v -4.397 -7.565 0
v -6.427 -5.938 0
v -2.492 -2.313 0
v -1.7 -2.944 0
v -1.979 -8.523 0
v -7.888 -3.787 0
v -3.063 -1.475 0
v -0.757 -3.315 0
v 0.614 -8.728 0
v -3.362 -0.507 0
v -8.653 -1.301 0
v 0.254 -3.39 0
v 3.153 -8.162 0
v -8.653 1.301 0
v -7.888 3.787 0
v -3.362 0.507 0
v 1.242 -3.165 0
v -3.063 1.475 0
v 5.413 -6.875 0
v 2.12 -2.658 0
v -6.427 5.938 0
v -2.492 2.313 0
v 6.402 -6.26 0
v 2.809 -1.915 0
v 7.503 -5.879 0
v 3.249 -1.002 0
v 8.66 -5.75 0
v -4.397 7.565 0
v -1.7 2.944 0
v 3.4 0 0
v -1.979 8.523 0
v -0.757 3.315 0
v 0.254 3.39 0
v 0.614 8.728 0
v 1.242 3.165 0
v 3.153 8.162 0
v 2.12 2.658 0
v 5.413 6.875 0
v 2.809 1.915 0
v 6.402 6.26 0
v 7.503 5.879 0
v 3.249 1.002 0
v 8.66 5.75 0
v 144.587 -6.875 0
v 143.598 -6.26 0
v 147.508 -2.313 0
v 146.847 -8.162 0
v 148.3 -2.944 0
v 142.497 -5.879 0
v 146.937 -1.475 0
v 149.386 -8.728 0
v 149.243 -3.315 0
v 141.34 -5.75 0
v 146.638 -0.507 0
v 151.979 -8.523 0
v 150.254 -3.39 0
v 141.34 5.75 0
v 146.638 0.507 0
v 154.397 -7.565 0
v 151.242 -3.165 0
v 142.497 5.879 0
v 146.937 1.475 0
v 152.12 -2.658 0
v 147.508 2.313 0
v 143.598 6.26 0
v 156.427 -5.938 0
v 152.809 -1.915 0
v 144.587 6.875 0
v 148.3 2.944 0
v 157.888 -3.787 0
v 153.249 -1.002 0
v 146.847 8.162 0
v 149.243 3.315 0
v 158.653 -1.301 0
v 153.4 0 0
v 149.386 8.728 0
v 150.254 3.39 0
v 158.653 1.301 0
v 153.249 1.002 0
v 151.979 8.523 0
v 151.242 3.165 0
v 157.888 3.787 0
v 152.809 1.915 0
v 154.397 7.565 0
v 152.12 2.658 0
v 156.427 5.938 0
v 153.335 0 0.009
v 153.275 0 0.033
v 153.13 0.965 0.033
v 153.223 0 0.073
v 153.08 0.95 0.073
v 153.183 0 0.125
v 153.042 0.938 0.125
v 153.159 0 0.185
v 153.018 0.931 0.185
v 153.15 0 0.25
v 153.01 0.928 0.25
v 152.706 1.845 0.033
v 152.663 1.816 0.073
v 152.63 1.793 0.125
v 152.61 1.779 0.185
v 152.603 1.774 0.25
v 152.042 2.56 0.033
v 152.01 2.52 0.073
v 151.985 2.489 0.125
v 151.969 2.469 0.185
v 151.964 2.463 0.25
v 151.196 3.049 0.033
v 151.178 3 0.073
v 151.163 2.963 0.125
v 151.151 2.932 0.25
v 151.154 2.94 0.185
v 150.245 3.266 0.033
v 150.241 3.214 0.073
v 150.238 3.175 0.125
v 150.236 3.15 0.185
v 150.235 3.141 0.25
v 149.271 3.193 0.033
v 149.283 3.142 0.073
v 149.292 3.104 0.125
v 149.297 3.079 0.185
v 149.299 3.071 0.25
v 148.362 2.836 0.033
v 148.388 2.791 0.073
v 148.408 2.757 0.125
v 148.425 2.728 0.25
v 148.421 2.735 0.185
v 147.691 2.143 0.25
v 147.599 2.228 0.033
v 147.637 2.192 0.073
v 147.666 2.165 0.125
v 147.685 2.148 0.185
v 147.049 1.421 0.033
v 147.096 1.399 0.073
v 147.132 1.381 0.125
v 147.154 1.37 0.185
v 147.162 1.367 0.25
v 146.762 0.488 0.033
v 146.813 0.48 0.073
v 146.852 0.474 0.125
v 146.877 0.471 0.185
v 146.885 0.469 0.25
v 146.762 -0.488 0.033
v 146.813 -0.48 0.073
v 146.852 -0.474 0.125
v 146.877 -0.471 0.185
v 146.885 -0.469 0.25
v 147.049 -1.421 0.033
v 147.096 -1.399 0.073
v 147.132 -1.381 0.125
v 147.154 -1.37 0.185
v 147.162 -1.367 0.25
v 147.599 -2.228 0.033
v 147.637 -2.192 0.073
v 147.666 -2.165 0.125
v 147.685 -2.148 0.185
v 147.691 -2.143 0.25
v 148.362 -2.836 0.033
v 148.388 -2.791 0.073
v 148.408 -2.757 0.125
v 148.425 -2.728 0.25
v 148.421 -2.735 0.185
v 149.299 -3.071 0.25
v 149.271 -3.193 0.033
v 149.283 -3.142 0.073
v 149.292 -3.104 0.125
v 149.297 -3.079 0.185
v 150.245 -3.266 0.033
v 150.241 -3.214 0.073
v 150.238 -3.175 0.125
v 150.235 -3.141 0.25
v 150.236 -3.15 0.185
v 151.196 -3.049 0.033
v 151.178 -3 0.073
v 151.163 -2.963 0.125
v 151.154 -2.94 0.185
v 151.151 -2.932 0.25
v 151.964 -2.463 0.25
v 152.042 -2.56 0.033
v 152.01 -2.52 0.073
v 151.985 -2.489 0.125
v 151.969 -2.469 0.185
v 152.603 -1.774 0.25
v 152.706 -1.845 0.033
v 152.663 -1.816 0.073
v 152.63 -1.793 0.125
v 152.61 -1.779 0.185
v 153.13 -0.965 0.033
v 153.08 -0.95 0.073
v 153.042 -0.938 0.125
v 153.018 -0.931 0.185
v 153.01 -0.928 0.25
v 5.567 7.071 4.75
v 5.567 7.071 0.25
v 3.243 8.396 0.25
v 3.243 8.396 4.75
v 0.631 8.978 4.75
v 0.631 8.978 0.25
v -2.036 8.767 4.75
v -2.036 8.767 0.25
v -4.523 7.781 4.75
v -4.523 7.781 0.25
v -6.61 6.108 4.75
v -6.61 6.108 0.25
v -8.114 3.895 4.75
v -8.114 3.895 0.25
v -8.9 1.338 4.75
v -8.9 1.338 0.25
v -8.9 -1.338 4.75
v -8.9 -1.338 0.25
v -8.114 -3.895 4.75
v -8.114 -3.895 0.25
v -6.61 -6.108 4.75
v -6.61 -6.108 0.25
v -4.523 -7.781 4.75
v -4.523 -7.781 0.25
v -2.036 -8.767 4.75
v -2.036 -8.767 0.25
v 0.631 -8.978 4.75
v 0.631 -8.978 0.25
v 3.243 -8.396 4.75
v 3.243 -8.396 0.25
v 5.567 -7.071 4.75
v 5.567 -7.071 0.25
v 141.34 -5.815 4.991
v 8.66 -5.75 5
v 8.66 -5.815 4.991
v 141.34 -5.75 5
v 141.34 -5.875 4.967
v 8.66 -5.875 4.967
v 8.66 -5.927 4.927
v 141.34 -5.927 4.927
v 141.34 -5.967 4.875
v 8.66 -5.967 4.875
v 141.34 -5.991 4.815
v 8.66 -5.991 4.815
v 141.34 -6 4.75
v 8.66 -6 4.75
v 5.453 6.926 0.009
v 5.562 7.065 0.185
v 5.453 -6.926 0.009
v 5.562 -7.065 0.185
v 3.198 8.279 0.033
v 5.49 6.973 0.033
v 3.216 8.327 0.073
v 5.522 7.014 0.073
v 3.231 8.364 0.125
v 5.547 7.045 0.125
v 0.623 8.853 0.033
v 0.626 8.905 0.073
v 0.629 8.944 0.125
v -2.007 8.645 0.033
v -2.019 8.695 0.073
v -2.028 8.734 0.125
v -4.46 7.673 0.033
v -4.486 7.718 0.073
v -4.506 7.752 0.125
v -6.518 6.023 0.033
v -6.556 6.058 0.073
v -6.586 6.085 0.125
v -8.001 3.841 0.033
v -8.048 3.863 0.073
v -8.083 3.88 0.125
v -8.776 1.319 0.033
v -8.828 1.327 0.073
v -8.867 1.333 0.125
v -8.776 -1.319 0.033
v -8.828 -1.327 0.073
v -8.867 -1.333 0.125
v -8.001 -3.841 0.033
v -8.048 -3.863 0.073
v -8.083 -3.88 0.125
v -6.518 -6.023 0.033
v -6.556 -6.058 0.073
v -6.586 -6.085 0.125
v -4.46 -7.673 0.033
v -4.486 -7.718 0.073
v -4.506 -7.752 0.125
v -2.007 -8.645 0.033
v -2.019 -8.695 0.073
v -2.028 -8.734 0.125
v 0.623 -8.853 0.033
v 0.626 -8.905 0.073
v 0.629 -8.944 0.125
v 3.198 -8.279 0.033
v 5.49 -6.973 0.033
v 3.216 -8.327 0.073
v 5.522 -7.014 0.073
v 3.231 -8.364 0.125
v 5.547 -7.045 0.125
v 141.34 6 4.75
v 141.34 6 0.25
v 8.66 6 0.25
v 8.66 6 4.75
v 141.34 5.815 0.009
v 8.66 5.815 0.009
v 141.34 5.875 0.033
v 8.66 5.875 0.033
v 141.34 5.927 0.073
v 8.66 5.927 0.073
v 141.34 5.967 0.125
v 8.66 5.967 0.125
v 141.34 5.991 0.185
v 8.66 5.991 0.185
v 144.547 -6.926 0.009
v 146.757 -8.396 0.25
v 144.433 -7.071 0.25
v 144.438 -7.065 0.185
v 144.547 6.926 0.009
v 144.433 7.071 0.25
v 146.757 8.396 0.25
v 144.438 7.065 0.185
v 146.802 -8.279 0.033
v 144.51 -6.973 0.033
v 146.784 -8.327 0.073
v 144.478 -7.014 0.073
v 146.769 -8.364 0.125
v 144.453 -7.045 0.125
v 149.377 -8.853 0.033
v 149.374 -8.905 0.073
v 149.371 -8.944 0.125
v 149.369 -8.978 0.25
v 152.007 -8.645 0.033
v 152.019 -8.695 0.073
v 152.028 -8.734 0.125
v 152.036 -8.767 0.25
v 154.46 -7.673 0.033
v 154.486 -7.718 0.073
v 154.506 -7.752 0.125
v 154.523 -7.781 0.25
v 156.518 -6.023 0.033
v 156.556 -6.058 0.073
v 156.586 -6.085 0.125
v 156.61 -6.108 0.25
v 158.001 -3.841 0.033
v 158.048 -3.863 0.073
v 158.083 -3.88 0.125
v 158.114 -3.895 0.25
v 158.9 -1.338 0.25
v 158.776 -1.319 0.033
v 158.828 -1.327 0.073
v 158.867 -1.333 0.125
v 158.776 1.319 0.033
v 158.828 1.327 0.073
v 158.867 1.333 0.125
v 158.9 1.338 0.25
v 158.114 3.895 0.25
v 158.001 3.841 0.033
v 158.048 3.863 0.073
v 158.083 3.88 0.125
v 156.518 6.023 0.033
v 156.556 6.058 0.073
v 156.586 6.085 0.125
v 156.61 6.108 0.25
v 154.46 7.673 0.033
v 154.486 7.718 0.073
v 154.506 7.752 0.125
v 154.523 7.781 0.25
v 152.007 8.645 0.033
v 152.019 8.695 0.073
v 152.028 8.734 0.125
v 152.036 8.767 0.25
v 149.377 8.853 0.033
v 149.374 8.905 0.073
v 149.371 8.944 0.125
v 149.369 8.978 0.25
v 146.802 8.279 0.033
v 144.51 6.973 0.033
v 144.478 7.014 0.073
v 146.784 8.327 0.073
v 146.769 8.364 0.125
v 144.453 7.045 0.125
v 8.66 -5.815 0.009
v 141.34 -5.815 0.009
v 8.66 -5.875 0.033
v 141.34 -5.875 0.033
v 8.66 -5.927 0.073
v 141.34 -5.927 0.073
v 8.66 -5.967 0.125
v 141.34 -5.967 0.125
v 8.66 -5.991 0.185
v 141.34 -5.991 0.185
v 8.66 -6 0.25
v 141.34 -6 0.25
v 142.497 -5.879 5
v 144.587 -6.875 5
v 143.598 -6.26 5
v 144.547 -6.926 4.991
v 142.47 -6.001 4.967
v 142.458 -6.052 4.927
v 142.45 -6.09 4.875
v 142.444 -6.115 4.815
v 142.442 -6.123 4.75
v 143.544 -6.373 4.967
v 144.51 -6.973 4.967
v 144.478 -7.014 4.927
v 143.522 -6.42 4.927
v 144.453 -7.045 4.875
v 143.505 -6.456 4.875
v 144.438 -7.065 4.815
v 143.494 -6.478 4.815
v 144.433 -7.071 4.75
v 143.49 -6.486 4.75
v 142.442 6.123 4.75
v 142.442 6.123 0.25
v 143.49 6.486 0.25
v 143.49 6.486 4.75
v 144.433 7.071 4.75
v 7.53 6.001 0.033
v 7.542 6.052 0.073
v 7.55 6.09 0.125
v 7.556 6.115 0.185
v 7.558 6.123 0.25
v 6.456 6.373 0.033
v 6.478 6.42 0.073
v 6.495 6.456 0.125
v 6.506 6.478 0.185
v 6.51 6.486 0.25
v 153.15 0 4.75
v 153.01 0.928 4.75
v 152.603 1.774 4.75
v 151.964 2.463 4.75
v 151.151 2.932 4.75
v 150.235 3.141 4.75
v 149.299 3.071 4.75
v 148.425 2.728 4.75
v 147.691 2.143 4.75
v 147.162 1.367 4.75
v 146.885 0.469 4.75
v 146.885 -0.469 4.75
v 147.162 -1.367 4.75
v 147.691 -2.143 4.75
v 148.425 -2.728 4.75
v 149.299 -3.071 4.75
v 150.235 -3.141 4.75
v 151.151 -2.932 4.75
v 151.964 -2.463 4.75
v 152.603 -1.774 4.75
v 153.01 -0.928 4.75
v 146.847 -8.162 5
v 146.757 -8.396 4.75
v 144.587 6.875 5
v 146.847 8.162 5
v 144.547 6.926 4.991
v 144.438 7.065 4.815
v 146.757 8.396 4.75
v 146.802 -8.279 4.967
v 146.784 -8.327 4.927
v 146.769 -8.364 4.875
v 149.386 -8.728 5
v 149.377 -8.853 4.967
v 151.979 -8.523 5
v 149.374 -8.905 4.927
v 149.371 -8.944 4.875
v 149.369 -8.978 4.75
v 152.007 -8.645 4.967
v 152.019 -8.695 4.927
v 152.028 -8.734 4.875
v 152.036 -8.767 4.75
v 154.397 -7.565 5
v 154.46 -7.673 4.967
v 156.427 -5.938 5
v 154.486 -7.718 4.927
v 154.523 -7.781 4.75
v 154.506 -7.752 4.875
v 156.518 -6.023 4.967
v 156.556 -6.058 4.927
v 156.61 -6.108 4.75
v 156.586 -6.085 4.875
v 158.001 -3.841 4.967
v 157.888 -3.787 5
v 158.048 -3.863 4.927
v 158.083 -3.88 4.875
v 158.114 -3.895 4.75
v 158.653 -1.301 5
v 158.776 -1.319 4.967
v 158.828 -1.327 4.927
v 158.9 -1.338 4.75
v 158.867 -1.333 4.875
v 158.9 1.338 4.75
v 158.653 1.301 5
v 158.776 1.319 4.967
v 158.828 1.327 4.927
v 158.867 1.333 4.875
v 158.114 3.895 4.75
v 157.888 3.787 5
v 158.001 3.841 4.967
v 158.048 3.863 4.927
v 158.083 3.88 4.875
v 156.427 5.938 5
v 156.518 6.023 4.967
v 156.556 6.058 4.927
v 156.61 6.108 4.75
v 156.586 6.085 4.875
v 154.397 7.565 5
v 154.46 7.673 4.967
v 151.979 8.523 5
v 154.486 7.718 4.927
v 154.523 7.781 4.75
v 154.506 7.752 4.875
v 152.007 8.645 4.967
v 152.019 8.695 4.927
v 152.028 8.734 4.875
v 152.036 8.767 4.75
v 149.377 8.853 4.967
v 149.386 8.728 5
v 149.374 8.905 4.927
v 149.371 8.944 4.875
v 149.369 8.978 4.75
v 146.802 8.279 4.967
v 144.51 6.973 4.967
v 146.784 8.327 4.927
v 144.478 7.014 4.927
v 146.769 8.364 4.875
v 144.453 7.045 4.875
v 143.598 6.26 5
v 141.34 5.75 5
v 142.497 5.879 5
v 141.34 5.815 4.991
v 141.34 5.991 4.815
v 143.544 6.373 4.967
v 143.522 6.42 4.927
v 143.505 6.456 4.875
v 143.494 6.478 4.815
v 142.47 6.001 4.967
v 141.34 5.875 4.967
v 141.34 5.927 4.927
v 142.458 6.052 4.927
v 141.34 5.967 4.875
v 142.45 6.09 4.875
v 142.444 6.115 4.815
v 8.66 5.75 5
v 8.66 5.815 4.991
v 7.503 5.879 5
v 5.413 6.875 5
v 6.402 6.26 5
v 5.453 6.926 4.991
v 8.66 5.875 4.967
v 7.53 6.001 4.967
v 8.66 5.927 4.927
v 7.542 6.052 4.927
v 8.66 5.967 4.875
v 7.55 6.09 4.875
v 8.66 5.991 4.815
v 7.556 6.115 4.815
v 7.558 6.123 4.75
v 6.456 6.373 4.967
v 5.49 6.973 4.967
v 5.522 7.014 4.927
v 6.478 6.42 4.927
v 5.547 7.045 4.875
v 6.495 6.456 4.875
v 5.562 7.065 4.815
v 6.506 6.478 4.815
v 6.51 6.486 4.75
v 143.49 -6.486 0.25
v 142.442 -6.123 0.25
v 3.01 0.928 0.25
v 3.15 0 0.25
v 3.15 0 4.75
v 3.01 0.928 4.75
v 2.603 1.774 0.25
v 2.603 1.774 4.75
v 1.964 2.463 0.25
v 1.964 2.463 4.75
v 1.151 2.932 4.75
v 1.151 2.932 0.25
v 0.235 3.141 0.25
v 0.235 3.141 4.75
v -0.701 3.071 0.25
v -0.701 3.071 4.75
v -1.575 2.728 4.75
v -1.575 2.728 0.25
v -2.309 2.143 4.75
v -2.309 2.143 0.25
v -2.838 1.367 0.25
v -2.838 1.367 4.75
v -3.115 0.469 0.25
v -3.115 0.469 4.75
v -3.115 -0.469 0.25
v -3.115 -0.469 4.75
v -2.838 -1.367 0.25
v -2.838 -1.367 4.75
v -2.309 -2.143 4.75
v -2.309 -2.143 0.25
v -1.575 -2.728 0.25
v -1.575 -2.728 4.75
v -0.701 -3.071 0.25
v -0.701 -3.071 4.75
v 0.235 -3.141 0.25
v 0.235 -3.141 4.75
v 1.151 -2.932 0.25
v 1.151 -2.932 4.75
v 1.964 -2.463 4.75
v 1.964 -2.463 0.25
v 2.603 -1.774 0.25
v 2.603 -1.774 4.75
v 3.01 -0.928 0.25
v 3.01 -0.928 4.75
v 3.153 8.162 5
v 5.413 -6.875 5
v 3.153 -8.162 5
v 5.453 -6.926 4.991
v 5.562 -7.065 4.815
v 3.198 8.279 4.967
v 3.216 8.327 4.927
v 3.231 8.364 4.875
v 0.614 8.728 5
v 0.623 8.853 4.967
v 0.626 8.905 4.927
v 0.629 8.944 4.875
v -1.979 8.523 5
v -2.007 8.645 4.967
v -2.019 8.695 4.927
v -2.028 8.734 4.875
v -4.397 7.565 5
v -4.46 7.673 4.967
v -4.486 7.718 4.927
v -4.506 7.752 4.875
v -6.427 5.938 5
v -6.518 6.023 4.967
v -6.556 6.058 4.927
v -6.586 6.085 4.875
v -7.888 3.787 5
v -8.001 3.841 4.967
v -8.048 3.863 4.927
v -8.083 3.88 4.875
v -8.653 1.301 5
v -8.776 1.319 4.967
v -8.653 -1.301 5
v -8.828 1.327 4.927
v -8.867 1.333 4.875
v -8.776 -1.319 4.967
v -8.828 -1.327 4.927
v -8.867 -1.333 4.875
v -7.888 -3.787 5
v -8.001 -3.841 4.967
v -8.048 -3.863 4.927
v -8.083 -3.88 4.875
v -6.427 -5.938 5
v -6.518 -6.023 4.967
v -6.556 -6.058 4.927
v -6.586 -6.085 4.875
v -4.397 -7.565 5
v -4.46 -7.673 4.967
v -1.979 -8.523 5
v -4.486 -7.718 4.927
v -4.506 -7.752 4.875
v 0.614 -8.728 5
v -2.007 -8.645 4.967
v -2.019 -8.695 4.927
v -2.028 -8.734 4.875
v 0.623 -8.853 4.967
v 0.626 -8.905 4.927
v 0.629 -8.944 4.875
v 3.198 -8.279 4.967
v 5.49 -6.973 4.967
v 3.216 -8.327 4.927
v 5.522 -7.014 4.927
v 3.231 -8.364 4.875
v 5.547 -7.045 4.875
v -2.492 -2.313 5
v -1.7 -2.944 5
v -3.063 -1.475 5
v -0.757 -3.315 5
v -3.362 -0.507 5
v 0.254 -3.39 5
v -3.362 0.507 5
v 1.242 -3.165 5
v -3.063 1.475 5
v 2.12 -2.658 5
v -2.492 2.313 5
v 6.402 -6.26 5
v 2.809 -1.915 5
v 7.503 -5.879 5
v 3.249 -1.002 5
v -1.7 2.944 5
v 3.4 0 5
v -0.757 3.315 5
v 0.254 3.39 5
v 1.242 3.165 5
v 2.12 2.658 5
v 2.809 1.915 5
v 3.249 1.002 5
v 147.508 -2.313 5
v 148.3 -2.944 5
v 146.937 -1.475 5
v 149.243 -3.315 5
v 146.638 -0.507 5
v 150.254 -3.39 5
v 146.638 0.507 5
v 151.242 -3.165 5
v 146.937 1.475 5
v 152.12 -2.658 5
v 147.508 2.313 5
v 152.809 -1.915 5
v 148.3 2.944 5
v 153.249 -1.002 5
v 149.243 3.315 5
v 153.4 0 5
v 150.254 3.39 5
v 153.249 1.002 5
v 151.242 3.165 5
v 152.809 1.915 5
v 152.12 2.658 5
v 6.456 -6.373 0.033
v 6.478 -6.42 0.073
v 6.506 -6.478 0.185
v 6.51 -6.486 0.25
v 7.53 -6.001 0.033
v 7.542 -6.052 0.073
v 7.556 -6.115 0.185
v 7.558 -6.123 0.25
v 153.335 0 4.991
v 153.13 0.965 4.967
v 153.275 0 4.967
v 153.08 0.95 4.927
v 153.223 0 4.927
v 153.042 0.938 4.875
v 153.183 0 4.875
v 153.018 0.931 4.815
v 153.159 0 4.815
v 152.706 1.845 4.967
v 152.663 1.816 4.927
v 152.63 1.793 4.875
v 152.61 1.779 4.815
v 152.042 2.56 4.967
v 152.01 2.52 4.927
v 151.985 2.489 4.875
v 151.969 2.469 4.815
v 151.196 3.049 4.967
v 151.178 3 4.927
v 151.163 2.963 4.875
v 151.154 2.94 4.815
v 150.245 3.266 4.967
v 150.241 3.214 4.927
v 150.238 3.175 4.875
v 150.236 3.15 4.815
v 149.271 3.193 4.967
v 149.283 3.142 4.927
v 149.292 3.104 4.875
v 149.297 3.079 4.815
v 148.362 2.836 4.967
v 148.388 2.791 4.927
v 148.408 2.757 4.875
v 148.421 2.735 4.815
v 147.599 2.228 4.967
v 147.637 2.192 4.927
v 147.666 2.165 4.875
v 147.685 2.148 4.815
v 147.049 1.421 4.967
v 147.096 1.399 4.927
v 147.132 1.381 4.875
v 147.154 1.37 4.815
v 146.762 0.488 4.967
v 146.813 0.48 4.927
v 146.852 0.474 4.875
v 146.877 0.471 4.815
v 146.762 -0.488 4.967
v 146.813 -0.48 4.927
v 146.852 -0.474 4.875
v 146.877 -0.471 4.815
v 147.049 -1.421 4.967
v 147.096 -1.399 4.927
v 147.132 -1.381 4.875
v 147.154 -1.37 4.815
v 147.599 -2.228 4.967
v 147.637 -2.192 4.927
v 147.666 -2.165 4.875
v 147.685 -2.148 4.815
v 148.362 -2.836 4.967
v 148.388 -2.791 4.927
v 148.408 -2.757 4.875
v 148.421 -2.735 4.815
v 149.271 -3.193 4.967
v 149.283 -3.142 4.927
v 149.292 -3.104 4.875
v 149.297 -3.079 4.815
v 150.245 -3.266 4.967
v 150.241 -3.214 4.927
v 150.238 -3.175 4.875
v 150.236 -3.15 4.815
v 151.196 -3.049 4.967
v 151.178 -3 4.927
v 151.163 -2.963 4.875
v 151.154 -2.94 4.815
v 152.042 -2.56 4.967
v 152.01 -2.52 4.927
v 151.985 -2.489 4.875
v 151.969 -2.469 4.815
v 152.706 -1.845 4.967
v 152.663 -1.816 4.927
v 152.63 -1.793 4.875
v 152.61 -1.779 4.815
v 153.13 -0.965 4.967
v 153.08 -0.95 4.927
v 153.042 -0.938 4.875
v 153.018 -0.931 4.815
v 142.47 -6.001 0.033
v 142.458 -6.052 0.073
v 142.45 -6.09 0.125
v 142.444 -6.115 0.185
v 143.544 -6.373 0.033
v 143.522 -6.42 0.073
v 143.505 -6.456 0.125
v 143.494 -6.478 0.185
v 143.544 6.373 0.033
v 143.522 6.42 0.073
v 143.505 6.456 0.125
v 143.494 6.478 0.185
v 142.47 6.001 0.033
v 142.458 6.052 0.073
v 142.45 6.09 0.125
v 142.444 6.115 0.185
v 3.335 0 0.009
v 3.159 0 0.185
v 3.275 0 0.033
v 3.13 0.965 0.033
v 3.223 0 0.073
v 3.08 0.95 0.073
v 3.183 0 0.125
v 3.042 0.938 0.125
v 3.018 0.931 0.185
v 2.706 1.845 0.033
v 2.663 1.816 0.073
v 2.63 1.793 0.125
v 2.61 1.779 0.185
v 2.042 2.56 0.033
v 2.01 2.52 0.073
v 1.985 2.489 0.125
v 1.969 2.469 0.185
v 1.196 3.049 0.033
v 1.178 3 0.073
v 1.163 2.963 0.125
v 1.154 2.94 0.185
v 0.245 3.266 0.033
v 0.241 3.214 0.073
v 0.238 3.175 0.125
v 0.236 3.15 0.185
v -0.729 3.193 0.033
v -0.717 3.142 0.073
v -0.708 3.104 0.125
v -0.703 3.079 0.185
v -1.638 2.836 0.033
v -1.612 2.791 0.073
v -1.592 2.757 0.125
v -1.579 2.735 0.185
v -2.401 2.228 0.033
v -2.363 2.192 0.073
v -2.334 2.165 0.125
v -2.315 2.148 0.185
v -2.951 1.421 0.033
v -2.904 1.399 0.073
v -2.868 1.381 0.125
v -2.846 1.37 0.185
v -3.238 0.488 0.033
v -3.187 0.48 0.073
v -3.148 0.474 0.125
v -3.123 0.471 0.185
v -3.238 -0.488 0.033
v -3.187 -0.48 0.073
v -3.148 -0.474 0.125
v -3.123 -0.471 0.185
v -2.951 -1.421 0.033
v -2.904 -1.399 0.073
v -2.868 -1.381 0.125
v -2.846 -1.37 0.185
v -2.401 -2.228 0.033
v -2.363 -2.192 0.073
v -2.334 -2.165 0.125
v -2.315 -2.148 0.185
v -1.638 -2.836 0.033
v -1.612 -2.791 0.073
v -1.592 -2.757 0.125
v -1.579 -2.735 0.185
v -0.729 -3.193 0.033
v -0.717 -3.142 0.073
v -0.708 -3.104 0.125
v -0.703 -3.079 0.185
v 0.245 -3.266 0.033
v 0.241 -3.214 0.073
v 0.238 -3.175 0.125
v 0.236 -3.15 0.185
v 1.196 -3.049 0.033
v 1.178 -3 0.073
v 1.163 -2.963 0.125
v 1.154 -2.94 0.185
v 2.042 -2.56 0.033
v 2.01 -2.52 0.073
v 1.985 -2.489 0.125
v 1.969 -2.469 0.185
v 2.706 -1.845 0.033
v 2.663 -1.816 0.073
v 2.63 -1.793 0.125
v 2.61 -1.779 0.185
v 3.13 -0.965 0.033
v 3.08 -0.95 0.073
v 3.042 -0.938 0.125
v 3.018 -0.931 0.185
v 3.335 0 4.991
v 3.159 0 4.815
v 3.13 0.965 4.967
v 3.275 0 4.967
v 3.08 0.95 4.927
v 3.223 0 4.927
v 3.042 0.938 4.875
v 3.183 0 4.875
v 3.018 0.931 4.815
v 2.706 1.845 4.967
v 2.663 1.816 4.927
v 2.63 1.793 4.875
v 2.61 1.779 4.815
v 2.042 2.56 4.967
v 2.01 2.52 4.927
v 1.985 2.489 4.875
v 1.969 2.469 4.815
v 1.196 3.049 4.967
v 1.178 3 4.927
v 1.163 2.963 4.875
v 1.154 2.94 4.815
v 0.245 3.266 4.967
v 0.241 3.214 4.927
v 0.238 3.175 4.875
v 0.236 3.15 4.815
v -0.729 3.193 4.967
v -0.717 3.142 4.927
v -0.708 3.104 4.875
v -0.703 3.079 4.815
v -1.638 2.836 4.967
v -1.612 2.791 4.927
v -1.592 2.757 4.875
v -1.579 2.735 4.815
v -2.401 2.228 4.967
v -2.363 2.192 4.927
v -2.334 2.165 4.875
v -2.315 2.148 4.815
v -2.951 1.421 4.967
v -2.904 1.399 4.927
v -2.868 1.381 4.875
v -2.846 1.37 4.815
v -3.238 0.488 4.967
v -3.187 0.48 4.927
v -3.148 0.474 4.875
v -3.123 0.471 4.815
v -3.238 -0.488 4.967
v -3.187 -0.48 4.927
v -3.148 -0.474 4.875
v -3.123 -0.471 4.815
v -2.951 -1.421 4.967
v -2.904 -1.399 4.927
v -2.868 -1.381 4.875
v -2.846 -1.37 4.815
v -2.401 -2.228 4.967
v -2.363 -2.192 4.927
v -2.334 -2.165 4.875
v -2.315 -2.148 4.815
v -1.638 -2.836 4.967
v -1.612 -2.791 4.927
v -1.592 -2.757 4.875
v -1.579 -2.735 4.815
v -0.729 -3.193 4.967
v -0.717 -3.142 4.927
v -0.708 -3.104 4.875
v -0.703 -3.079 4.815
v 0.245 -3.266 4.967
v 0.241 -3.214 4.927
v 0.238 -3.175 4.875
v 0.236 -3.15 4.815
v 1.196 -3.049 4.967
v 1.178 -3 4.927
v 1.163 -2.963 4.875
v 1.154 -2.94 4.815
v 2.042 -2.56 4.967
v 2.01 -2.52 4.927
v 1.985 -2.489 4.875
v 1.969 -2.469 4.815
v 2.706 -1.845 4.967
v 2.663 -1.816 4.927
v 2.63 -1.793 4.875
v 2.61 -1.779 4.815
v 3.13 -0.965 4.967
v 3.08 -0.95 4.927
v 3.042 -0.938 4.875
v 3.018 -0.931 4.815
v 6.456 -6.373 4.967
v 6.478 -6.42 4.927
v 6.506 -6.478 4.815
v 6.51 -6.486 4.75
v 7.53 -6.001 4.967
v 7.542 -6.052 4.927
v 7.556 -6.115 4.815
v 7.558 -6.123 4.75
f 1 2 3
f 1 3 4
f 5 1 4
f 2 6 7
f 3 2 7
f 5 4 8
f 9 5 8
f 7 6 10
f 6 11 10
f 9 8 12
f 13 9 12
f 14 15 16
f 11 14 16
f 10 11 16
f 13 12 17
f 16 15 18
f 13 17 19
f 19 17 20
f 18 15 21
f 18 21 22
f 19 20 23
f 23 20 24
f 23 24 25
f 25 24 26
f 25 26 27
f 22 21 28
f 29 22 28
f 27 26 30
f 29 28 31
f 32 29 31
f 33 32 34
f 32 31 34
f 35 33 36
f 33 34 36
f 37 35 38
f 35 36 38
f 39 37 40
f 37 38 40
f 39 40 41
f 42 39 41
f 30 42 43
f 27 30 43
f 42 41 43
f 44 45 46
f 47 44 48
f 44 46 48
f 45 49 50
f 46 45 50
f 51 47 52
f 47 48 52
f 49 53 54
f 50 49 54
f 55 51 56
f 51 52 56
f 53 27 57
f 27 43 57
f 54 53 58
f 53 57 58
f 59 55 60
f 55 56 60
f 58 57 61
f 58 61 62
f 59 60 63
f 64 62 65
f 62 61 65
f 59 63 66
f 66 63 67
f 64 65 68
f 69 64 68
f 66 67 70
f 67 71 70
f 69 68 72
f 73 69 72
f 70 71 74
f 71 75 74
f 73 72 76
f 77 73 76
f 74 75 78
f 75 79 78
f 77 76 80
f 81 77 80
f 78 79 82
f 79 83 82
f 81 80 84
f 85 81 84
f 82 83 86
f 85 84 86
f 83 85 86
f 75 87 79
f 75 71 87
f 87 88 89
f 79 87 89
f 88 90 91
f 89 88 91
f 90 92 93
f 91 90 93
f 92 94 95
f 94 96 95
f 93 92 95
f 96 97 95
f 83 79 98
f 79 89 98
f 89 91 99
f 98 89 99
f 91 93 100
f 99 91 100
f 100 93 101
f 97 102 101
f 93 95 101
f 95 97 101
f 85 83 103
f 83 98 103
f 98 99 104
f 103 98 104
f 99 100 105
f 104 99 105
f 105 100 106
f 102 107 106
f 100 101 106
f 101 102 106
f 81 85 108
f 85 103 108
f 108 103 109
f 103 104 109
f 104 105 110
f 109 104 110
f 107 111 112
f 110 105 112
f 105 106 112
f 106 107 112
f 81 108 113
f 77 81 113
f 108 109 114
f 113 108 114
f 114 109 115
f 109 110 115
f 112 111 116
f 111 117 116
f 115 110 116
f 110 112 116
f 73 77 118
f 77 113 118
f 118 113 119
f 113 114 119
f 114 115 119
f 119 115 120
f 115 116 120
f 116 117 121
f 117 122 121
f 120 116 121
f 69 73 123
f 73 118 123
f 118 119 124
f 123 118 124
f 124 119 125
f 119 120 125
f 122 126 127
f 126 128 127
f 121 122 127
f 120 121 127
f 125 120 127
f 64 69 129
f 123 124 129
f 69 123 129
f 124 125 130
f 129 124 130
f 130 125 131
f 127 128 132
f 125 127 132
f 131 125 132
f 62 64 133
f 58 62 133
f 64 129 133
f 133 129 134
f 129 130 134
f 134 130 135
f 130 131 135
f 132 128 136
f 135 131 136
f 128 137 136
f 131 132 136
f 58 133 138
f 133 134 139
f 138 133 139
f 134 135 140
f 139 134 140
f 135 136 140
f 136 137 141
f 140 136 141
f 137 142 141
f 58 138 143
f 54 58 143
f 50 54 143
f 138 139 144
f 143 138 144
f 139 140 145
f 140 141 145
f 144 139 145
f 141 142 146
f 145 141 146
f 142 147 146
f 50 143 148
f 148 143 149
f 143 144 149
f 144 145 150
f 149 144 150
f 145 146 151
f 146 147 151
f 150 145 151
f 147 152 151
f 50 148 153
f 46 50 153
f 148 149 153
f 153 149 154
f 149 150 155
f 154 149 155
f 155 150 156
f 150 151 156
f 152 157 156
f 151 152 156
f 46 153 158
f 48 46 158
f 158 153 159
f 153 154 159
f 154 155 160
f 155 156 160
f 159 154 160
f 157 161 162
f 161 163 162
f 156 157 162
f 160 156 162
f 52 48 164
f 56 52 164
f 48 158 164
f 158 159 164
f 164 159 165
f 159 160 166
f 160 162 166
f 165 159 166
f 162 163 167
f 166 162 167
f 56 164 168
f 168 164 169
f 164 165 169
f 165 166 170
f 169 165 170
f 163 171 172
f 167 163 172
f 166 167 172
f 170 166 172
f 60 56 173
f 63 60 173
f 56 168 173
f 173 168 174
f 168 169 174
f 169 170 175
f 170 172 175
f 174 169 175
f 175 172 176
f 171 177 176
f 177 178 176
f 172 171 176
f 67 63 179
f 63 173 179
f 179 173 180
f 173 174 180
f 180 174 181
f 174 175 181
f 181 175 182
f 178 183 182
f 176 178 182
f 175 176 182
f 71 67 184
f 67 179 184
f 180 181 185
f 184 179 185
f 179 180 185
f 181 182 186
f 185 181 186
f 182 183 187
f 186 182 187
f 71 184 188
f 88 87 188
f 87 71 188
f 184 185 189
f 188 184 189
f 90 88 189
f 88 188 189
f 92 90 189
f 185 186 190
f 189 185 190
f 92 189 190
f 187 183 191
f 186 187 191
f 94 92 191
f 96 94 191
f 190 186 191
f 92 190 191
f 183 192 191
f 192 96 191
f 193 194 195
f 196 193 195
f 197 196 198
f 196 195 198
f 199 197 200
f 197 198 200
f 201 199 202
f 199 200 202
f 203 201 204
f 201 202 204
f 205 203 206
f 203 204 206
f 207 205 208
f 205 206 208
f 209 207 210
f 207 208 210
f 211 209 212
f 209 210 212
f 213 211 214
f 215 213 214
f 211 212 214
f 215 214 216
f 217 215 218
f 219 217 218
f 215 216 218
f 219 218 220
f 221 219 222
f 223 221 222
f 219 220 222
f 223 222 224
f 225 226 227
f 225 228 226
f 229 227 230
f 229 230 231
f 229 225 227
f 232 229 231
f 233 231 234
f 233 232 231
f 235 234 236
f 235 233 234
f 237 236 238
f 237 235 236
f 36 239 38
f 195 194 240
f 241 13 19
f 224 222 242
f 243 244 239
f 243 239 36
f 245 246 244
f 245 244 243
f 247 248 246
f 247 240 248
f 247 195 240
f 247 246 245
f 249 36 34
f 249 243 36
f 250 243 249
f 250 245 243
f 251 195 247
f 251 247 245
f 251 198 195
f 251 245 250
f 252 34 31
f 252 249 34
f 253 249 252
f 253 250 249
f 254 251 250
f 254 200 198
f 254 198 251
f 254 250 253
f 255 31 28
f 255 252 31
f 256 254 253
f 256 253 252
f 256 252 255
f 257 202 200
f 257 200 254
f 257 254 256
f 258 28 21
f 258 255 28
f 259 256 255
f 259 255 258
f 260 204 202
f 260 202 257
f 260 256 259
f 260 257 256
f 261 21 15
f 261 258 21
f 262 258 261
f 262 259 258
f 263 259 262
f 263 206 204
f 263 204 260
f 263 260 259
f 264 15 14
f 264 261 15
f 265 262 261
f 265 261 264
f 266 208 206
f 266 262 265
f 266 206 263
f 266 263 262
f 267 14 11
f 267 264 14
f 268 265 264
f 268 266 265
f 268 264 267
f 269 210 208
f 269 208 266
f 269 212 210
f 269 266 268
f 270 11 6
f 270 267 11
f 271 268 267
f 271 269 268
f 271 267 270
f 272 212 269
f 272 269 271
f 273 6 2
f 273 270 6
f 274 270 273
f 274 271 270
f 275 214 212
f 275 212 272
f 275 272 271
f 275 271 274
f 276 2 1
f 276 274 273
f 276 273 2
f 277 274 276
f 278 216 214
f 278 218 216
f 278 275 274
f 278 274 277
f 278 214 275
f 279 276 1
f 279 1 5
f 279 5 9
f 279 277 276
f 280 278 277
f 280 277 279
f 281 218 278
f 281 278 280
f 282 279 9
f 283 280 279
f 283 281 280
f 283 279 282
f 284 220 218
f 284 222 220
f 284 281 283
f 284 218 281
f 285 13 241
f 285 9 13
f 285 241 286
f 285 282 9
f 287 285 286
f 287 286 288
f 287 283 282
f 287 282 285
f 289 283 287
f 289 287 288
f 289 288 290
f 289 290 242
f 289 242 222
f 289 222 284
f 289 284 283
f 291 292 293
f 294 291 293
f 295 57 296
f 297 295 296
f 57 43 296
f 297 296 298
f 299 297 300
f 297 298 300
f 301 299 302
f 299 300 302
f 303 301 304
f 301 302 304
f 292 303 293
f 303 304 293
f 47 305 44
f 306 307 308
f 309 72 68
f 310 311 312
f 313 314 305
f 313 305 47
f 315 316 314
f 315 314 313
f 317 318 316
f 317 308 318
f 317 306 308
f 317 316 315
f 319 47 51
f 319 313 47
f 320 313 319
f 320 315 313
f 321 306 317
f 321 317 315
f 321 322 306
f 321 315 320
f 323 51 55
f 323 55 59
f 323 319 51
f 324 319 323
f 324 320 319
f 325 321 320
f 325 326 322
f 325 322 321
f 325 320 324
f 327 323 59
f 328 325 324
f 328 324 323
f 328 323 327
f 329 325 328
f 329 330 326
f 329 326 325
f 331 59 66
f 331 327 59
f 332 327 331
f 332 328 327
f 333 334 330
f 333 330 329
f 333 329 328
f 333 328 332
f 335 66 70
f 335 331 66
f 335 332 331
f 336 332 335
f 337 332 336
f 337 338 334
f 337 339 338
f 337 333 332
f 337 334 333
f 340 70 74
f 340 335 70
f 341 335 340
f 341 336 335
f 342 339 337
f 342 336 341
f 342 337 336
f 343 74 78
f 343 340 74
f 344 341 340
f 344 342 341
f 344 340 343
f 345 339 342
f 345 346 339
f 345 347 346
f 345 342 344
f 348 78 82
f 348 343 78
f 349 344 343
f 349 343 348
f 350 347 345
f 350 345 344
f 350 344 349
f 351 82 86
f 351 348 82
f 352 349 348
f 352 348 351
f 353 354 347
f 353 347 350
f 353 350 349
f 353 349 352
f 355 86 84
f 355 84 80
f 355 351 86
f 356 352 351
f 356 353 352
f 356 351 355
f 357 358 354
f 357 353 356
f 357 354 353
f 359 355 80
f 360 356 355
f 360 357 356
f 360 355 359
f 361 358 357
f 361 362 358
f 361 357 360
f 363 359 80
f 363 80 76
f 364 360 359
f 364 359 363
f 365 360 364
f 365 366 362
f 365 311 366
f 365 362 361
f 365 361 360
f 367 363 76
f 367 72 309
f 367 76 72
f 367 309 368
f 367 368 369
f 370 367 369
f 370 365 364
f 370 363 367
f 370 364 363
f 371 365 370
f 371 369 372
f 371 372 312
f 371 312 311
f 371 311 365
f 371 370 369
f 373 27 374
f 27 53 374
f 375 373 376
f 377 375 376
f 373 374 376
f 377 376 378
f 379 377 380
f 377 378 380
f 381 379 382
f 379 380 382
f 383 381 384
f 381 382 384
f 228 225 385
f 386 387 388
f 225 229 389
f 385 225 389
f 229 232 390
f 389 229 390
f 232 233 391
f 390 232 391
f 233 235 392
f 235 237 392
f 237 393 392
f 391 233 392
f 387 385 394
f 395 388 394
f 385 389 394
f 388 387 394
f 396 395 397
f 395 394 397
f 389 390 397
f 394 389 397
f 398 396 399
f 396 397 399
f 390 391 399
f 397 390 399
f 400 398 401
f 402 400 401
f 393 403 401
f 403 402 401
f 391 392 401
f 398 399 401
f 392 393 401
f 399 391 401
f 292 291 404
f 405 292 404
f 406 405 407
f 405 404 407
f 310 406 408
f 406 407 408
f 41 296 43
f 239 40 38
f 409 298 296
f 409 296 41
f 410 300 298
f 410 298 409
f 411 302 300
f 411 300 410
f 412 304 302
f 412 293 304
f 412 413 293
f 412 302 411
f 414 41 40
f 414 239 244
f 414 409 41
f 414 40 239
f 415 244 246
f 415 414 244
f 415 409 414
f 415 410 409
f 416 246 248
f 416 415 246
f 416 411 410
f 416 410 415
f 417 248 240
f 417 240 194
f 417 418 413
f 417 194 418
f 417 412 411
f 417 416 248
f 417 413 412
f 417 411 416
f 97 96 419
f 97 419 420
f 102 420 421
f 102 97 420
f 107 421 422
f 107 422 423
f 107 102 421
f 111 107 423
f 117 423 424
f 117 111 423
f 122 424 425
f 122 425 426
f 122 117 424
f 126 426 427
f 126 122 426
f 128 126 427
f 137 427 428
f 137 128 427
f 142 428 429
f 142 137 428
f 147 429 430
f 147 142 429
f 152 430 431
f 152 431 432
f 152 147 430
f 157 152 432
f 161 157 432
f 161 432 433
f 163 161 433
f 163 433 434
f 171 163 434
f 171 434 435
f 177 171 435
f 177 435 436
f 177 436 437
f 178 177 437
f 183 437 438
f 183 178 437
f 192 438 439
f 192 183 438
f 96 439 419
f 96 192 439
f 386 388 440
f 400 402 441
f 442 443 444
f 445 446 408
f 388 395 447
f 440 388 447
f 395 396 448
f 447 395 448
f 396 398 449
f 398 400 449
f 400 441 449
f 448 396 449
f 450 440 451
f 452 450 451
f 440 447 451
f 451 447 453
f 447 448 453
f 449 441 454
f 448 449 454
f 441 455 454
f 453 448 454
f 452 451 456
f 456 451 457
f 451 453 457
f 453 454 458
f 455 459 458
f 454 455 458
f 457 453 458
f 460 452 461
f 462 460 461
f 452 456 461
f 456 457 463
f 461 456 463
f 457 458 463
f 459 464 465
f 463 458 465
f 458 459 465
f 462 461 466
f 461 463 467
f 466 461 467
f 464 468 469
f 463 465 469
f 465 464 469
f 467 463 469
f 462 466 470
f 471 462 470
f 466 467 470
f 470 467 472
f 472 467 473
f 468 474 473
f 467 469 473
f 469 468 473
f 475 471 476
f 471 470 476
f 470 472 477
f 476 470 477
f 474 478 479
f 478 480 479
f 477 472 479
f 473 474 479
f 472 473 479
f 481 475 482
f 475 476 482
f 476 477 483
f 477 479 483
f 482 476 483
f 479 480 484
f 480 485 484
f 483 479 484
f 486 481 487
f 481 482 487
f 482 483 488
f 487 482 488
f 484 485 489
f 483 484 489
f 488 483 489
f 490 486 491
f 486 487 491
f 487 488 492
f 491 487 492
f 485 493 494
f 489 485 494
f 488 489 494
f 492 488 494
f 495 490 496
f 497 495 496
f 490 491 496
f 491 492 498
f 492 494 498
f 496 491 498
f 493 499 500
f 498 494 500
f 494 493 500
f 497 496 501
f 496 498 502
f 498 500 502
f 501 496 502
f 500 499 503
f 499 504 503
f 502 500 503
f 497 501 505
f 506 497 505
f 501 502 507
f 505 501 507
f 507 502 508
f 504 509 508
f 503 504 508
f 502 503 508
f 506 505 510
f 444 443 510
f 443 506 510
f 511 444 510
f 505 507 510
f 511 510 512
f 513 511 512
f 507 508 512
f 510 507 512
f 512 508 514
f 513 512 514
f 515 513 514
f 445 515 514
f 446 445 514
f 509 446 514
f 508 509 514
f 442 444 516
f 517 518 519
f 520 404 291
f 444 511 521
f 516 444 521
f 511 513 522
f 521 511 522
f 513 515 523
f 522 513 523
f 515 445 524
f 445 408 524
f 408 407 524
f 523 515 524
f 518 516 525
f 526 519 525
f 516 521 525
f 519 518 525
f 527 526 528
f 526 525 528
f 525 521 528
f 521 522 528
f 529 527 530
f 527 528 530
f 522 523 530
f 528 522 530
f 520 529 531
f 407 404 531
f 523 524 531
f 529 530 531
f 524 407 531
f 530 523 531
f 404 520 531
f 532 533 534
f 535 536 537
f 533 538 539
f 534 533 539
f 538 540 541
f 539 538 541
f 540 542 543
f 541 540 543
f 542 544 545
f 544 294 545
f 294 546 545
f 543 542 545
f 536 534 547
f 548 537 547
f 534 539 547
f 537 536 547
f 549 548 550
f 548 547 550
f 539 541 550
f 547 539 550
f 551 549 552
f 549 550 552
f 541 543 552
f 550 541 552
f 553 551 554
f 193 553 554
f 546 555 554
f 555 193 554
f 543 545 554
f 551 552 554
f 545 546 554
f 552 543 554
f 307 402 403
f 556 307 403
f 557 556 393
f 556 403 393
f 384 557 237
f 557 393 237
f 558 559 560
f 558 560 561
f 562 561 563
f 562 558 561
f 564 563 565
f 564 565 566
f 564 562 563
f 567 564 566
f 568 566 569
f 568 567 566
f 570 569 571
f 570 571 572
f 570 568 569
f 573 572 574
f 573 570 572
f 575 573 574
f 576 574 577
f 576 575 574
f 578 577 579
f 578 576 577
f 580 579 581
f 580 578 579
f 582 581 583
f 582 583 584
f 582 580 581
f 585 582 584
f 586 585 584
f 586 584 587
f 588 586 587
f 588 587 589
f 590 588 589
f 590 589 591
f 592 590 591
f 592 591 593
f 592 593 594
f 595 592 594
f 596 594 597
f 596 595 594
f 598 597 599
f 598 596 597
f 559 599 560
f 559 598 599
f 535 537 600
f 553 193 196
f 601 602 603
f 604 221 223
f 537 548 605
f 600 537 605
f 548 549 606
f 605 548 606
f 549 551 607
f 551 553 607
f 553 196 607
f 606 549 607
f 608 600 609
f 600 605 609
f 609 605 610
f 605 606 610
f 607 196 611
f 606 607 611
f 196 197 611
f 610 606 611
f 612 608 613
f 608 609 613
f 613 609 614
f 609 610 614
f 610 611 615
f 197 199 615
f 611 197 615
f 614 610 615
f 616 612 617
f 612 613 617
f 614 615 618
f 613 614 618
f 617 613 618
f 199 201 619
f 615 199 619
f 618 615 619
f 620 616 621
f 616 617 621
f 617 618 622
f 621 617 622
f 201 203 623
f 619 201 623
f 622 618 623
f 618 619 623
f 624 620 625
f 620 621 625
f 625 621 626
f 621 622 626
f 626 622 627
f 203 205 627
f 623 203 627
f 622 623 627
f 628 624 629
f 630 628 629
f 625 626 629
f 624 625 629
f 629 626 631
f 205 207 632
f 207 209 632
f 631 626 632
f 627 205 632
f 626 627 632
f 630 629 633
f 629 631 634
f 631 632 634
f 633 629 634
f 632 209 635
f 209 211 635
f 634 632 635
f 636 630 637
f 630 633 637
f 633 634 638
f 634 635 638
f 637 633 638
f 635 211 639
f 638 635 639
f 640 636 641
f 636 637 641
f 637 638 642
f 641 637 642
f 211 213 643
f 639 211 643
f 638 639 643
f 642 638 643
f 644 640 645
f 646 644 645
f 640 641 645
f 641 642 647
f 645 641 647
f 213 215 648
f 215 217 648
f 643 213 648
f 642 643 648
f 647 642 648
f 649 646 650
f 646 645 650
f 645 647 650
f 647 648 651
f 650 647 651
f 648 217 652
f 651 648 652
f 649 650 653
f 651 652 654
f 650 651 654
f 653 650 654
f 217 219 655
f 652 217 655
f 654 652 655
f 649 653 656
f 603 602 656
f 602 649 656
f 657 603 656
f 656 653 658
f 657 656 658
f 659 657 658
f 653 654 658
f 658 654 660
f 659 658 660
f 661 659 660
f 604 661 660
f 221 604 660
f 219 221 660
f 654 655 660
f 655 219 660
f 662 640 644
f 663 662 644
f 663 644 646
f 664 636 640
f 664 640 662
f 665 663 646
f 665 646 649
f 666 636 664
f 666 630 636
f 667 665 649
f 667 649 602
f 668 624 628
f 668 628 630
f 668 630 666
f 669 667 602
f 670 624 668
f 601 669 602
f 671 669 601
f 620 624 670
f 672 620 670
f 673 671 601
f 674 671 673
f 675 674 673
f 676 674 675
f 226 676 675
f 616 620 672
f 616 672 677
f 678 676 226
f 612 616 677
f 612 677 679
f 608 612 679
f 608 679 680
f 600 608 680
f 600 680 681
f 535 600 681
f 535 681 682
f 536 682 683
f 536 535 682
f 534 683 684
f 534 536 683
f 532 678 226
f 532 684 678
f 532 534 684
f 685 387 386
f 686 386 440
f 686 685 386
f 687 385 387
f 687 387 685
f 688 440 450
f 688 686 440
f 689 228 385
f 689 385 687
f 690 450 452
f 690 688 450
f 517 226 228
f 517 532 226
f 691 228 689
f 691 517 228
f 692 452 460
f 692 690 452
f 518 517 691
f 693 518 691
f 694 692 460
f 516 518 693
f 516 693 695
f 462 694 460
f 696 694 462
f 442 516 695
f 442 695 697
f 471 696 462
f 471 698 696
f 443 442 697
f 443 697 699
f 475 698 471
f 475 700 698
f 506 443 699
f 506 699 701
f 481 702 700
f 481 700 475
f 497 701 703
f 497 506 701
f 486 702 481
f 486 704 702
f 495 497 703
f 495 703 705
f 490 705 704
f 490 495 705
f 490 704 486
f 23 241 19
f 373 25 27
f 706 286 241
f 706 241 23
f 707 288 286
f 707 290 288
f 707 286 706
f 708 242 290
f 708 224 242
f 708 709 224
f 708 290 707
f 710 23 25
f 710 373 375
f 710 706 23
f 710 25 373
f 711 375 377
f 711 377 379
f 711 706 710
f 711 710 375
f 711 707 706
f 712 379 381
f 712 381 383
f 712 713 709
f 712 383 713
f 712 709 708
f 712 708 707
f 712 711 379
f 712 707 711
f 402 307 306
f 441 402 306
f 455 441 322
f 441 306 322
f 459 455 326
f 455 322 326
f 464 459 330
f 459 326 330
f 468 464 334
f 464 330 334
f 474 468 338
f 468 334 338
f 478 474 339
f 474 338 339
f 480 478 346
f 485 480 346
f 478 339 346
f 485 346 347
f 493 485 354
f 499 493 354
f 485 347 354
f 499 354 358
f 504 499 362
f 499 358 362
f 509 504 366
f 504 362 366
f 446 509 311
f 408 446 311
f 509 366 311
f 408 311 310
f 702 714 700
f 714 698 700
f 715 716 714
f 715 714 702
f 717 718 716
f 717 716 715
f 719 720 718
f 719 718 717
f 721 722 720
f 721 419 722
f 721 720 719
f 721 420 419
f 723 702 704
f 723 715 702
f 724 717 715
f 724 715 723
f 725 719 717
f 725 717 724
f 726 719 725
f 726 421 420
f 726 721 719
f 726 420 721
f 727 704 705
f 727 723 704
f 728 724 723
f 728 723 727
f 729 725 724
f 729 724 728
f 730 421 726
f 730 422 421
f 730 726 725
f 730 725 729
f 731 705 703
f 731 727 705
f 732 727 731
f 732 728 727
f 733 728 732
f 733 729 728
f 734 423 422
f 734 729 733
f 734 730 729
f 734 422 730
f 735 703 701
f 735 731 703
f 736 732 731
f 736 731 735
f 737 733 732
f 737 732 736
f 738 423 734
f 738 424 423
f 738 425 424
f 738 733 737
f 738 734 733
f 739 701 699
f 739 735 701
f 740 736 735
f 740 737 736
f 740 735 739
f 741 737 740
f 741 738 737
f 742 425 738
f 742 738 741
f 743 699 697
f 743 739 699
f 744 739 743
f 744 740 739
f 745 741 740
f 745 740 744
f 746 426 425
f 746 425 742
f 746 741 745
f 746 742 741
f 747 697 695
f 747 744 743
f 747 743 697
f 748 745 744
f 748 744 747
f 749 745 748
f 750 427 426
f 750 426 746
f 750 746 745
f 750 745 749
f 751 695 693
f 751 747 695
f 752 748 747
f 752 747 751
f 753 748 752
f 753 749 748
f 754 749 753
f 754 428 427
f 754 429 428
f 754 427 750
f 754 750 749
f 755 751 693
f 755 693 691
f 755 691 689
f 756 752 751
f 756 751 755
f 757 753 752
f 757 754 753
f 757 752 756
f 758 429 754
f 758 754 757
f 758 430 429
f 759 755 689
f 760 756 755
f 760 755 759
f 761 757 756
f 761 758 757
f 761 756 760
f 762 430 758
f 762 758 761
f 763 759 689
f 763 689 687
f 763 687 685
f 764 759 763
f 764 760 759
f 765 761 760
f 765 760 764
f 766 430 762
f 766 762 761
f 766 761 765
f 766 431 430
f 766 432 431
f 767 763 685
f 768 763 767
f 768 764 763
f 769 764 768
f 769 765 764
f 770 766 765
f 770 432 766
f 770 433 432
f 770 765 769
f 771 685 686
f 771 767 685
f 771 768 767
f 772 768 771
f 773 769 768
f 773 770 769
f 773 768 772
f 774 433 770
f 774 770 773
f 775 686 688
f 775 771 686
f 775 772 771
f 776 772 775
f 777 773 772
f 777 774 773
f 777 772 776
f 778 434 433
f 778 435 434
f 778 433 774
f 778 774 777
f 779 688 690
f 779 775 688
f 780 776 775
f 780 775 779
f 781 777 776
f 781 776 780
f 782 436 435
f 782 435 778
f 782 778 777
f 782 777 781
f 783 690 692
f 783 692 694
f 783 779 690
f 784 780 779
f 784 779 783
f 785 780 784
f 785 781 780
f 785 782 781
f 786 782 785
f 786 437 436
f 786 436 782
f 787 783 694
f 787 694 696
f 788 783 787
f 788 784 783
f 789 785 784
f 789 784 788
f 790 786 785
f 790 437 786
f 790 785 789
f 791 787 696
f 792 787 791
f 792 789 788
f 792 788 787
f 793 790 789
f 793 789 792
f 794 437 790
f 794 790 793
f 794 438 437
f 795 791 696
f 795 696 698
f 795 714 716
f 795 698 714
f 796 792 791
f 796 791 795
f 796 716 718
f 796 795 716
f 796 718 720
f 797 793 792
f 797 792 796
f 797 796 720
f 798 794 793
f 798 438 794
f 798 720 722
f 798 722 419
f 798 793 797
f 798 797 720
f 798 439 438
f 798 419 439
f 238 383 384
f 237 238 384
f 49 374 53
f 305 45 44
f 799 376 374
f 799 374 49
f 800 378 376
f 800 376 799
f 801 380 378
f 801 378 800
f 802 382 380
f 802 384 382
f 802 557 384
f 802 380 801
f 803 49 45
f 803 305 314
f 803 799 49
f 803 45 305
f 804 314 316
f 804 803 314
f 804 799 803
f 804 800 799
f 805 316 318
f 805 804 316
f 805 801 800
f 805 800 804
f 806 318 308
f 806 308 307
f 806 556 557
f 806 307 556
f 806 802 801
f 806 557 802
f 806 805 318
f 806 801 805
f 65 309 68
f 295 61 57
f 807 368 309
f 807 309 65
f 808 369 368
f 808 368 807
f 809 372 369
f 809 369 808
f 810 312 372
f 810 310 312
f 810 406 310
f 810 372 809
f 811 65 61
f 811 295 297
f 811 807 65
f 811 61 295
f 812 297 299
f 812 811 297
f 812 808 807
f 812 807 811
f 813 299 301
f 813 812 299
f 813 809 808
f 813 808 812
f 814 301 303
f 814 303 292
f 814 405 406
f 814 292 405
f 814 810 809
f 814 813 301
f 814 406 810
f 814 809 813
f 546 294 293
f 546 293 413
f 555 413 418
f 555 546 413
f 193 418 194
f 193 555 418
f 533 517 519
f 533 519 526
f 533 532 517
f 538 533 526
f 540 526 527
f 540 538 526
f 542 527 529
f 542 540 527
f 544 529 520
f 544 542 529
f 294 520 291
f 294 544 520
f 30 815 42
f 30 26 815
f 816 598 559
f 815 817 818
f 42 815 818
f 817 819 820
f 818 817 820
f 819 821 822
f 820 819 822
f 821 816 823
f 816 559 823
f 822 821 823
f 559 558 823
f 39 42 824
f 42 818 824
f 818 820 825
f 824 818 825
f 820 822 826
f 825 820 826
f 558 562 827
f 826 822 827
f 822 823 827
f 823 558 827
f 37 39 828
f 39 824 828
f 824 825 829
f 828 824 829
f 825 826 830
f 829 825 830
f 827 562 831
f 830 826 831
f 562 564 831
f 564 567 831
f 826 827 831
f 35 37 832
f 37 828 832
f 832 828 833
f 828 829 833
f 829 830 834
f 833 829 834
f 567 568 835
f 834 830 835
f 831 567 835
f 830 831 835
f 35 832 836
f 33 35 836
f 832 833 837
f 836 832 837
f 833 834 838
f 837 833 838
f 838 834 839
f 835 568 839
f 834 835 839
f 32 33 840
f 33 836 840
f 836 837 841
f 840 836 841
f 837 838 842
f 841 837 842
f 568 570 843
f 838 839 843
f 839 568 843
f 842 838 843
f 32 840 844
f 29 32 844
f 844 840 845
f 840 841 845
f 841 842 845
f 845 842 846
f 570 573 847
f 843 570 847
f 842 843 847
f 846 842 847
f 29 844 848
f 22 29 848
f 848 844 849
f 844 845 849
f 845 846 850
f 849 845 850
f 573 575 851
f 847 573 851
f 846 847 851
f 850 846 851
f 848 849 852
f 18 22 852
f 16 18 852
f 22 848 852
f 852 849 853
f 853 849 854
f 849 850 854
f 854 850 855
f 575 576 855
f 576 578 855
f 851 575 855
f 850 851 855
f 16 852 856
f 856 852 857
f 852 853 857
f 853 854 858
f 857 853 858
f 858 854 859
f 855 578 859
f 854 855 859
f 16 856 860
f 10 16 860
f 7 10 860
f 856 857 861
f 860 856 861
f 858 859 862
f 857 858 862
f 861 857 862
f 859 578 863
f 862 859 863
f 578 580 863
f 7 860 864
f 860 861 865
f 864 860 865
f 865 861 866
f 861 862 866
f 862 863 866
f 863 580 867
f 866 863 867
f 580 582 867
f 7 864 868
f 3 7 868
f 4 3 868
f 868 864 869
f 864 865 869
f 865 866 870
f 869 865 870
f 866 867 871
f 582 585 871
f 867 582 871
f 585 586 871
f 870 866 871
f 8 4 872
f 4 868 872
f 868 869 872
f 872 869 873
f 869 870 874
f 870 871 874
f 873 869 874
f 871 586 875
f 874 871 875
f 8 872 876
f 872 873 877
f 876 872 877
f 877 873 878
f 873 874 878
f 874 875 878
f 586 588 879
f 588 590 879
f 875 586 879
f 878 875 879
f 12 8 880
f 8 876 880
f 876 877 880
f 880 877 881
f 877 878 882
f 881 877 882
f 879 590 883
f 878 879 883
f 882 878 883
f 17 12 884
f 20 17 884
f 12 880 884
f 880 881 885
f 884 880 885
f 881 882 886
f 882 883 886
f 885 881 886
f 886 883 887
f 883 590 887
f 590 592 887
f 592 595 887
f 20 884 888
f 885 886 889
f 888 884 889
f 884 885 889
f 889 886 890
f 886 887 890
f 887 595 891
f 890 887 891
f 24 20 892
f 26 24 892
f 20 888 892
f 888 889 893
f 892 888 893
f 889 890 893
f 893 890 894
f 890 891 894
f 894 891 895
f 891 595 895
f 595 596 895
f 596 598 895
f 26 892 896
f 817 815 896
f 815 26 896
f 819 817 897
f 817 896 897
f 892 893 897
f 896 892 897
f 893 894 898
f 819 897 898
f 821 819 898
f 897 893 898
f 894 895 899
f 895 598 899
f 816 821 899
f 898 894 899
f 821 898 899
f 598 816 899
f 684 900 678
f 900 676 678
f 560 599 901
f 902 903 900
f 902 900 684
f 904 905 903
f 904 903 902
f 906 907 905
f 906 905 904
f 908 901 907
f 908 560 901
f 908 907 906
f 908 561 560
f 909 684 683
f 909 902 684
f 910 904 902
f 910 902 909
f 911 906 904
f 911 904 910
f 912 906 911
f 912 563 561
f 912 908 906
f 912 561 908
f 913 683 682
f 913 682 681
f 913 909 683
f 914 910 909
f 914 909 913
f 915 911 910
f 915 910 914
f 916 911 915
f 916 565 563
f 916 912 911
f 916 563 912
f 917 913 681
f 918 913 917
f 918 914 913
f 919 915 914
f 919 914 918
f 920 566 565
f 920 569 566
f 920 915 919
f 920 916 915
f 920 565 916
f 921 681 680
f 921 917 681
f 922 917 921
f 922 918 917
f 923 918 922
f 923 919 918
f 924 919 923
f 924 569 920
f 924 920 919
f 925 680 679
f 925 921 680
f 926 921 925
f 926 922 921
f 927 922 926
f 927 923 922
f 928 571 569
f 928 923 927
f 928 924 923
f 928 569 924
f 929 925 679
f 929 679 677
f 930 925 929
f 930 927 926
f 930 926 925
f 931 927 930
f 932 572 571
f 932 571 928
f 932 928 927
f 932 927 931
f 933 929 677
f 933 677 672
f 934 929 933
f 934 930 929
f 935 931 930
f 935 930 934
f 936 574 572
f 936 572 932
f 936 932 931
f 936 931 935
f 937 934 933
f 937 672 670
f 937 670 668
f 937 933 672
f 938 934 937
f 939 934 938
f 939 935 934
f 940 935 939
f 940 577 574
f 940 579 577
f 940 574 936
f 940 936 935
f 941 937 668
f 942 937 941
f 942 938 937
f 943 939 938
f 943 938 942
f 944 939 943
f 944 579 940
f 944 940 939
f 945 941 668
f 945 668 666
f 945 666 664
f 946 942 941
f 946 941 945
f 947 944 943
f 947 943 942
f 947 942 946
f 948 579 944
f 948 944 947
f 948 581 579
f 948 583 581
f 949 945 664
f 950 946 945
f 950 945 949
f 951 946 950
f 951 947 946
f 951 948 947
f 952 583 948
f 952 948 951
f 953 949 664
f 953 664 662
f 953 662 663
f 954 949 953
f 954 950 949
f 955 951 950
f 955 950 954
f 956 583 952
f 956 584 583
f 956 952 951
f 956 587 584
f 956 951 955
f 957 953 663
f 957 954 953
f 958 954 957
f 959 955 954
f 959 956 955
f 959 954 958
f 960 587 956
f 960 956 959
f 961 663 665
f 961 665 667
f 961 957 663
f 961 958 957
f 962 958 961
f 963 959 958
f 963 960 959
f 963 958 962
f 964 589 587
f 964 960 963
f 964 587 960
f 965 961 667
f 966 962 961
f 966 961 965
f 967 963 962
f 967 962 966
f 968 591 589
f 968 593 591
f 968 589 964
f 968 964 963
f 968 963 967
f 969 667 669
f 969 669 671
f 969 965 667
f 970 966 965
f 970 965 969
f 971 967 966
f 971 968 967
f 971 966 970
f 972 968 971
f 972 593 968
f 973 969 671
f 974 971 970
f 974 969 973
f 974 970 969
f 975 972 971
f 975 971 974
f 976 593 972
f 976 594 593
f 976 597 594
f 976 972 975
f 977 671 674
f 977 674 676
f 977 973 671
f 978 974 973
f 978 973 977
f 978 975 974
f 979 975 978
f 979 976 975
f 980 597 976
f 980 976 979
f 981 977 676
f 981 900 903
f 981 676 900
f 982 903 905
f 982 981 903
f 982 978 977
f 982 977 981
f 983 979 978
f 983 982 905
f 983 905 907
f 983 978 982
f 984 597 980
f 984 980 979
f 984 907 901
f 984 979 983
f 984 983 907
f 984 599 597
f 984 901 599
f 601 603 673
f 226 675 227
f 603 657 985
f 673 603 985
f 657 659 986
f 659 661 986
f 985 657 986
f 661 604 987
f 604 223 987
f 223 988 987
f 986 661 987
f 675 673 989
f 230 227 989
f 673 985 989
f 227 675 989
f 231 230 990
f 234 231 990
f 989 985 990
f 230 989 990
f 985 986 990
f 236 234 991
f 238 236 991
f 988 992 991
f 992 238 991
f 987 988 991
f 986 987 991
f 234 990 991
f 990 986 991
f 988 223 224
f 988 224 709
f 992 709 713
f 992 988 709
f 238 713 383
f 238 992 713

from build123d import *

# Parameters (mm, degrees)
SKETCH1_R           = 3.15
BOSS_EXTRUDE2_DEPTH = 5
FILLET1_R           = 5
FILLET2_R           = 0.25


with BuildPart() as part:
    # Sketch1 → Boss-Extrude2 (new body)
    with BuildSketch(Plane.XY):
        with BuildLine():
            Line((143.291796068, 6), (6.708203932, 6))
            ThreePointArc((6.708203932, 6), (-9, 0), (6.708203932, -6))
            Line((6.708203932, -6), (75, -6))
            Line((75, -6), (143.291796068, -6))
            ThreePointArc((143.291796068, -6), (159, 0), (143.291796068, 6))
        make_face()
        Circle(SKETCH1_R, mode=Mode.SUBTRACT)
        with Locations((150, 0)):
            Circle(SKETCH1_R, mode=Mode.SUBTRACT)
    extrude(amount=BOSS_EXTRUDE2_DEPTH)

    # Fillet1
    fillet1_edges = [part.edges().sort_by_distance(p)[0] for p in [
        (143.291796068, -6, 2.5),
        (6.708203932, -6, 2.5),
        (6.708203932, 6, 2.5),
        (143.291796068, 6, 2.5),
    ]]
    fillet(fillet1_edges, radius=FILLET1_R)

    # Fillet2
    fillet2_edges = [part.edges().sort_by_distance(p)[0] for p in [
        (75, -6, 0),
        (75, -6, 5),
        (-9, 0, 0),
        (-9, 0, 5),
        (159, 0, 0),
        (146.85, 0, 5),
        (159, 0, 5),
        (75, 6, 0),
        (75, 6, 5),
        (7.023619861, -6.275444087, 0),
        (7.023619861, -6.275444087, 5),
        (-3.15, 0, 5),
        (142.976380139, -6.275444087, 0),
        (142.976380139, -6.275444087, 5),
        (142.976380139, 6.275444087, 0),
        (142.976380139, 6.275444087, 5),
        (7.023619861, 6.275444087, 0),
        (7.023619861, 6.275444087, 5),
        (-3.15, 0, 0),
        (146.85, 0, 0),
    ]]
    fillet(fillet2_edges, radius=FILLET2_R)


solid = part.part
